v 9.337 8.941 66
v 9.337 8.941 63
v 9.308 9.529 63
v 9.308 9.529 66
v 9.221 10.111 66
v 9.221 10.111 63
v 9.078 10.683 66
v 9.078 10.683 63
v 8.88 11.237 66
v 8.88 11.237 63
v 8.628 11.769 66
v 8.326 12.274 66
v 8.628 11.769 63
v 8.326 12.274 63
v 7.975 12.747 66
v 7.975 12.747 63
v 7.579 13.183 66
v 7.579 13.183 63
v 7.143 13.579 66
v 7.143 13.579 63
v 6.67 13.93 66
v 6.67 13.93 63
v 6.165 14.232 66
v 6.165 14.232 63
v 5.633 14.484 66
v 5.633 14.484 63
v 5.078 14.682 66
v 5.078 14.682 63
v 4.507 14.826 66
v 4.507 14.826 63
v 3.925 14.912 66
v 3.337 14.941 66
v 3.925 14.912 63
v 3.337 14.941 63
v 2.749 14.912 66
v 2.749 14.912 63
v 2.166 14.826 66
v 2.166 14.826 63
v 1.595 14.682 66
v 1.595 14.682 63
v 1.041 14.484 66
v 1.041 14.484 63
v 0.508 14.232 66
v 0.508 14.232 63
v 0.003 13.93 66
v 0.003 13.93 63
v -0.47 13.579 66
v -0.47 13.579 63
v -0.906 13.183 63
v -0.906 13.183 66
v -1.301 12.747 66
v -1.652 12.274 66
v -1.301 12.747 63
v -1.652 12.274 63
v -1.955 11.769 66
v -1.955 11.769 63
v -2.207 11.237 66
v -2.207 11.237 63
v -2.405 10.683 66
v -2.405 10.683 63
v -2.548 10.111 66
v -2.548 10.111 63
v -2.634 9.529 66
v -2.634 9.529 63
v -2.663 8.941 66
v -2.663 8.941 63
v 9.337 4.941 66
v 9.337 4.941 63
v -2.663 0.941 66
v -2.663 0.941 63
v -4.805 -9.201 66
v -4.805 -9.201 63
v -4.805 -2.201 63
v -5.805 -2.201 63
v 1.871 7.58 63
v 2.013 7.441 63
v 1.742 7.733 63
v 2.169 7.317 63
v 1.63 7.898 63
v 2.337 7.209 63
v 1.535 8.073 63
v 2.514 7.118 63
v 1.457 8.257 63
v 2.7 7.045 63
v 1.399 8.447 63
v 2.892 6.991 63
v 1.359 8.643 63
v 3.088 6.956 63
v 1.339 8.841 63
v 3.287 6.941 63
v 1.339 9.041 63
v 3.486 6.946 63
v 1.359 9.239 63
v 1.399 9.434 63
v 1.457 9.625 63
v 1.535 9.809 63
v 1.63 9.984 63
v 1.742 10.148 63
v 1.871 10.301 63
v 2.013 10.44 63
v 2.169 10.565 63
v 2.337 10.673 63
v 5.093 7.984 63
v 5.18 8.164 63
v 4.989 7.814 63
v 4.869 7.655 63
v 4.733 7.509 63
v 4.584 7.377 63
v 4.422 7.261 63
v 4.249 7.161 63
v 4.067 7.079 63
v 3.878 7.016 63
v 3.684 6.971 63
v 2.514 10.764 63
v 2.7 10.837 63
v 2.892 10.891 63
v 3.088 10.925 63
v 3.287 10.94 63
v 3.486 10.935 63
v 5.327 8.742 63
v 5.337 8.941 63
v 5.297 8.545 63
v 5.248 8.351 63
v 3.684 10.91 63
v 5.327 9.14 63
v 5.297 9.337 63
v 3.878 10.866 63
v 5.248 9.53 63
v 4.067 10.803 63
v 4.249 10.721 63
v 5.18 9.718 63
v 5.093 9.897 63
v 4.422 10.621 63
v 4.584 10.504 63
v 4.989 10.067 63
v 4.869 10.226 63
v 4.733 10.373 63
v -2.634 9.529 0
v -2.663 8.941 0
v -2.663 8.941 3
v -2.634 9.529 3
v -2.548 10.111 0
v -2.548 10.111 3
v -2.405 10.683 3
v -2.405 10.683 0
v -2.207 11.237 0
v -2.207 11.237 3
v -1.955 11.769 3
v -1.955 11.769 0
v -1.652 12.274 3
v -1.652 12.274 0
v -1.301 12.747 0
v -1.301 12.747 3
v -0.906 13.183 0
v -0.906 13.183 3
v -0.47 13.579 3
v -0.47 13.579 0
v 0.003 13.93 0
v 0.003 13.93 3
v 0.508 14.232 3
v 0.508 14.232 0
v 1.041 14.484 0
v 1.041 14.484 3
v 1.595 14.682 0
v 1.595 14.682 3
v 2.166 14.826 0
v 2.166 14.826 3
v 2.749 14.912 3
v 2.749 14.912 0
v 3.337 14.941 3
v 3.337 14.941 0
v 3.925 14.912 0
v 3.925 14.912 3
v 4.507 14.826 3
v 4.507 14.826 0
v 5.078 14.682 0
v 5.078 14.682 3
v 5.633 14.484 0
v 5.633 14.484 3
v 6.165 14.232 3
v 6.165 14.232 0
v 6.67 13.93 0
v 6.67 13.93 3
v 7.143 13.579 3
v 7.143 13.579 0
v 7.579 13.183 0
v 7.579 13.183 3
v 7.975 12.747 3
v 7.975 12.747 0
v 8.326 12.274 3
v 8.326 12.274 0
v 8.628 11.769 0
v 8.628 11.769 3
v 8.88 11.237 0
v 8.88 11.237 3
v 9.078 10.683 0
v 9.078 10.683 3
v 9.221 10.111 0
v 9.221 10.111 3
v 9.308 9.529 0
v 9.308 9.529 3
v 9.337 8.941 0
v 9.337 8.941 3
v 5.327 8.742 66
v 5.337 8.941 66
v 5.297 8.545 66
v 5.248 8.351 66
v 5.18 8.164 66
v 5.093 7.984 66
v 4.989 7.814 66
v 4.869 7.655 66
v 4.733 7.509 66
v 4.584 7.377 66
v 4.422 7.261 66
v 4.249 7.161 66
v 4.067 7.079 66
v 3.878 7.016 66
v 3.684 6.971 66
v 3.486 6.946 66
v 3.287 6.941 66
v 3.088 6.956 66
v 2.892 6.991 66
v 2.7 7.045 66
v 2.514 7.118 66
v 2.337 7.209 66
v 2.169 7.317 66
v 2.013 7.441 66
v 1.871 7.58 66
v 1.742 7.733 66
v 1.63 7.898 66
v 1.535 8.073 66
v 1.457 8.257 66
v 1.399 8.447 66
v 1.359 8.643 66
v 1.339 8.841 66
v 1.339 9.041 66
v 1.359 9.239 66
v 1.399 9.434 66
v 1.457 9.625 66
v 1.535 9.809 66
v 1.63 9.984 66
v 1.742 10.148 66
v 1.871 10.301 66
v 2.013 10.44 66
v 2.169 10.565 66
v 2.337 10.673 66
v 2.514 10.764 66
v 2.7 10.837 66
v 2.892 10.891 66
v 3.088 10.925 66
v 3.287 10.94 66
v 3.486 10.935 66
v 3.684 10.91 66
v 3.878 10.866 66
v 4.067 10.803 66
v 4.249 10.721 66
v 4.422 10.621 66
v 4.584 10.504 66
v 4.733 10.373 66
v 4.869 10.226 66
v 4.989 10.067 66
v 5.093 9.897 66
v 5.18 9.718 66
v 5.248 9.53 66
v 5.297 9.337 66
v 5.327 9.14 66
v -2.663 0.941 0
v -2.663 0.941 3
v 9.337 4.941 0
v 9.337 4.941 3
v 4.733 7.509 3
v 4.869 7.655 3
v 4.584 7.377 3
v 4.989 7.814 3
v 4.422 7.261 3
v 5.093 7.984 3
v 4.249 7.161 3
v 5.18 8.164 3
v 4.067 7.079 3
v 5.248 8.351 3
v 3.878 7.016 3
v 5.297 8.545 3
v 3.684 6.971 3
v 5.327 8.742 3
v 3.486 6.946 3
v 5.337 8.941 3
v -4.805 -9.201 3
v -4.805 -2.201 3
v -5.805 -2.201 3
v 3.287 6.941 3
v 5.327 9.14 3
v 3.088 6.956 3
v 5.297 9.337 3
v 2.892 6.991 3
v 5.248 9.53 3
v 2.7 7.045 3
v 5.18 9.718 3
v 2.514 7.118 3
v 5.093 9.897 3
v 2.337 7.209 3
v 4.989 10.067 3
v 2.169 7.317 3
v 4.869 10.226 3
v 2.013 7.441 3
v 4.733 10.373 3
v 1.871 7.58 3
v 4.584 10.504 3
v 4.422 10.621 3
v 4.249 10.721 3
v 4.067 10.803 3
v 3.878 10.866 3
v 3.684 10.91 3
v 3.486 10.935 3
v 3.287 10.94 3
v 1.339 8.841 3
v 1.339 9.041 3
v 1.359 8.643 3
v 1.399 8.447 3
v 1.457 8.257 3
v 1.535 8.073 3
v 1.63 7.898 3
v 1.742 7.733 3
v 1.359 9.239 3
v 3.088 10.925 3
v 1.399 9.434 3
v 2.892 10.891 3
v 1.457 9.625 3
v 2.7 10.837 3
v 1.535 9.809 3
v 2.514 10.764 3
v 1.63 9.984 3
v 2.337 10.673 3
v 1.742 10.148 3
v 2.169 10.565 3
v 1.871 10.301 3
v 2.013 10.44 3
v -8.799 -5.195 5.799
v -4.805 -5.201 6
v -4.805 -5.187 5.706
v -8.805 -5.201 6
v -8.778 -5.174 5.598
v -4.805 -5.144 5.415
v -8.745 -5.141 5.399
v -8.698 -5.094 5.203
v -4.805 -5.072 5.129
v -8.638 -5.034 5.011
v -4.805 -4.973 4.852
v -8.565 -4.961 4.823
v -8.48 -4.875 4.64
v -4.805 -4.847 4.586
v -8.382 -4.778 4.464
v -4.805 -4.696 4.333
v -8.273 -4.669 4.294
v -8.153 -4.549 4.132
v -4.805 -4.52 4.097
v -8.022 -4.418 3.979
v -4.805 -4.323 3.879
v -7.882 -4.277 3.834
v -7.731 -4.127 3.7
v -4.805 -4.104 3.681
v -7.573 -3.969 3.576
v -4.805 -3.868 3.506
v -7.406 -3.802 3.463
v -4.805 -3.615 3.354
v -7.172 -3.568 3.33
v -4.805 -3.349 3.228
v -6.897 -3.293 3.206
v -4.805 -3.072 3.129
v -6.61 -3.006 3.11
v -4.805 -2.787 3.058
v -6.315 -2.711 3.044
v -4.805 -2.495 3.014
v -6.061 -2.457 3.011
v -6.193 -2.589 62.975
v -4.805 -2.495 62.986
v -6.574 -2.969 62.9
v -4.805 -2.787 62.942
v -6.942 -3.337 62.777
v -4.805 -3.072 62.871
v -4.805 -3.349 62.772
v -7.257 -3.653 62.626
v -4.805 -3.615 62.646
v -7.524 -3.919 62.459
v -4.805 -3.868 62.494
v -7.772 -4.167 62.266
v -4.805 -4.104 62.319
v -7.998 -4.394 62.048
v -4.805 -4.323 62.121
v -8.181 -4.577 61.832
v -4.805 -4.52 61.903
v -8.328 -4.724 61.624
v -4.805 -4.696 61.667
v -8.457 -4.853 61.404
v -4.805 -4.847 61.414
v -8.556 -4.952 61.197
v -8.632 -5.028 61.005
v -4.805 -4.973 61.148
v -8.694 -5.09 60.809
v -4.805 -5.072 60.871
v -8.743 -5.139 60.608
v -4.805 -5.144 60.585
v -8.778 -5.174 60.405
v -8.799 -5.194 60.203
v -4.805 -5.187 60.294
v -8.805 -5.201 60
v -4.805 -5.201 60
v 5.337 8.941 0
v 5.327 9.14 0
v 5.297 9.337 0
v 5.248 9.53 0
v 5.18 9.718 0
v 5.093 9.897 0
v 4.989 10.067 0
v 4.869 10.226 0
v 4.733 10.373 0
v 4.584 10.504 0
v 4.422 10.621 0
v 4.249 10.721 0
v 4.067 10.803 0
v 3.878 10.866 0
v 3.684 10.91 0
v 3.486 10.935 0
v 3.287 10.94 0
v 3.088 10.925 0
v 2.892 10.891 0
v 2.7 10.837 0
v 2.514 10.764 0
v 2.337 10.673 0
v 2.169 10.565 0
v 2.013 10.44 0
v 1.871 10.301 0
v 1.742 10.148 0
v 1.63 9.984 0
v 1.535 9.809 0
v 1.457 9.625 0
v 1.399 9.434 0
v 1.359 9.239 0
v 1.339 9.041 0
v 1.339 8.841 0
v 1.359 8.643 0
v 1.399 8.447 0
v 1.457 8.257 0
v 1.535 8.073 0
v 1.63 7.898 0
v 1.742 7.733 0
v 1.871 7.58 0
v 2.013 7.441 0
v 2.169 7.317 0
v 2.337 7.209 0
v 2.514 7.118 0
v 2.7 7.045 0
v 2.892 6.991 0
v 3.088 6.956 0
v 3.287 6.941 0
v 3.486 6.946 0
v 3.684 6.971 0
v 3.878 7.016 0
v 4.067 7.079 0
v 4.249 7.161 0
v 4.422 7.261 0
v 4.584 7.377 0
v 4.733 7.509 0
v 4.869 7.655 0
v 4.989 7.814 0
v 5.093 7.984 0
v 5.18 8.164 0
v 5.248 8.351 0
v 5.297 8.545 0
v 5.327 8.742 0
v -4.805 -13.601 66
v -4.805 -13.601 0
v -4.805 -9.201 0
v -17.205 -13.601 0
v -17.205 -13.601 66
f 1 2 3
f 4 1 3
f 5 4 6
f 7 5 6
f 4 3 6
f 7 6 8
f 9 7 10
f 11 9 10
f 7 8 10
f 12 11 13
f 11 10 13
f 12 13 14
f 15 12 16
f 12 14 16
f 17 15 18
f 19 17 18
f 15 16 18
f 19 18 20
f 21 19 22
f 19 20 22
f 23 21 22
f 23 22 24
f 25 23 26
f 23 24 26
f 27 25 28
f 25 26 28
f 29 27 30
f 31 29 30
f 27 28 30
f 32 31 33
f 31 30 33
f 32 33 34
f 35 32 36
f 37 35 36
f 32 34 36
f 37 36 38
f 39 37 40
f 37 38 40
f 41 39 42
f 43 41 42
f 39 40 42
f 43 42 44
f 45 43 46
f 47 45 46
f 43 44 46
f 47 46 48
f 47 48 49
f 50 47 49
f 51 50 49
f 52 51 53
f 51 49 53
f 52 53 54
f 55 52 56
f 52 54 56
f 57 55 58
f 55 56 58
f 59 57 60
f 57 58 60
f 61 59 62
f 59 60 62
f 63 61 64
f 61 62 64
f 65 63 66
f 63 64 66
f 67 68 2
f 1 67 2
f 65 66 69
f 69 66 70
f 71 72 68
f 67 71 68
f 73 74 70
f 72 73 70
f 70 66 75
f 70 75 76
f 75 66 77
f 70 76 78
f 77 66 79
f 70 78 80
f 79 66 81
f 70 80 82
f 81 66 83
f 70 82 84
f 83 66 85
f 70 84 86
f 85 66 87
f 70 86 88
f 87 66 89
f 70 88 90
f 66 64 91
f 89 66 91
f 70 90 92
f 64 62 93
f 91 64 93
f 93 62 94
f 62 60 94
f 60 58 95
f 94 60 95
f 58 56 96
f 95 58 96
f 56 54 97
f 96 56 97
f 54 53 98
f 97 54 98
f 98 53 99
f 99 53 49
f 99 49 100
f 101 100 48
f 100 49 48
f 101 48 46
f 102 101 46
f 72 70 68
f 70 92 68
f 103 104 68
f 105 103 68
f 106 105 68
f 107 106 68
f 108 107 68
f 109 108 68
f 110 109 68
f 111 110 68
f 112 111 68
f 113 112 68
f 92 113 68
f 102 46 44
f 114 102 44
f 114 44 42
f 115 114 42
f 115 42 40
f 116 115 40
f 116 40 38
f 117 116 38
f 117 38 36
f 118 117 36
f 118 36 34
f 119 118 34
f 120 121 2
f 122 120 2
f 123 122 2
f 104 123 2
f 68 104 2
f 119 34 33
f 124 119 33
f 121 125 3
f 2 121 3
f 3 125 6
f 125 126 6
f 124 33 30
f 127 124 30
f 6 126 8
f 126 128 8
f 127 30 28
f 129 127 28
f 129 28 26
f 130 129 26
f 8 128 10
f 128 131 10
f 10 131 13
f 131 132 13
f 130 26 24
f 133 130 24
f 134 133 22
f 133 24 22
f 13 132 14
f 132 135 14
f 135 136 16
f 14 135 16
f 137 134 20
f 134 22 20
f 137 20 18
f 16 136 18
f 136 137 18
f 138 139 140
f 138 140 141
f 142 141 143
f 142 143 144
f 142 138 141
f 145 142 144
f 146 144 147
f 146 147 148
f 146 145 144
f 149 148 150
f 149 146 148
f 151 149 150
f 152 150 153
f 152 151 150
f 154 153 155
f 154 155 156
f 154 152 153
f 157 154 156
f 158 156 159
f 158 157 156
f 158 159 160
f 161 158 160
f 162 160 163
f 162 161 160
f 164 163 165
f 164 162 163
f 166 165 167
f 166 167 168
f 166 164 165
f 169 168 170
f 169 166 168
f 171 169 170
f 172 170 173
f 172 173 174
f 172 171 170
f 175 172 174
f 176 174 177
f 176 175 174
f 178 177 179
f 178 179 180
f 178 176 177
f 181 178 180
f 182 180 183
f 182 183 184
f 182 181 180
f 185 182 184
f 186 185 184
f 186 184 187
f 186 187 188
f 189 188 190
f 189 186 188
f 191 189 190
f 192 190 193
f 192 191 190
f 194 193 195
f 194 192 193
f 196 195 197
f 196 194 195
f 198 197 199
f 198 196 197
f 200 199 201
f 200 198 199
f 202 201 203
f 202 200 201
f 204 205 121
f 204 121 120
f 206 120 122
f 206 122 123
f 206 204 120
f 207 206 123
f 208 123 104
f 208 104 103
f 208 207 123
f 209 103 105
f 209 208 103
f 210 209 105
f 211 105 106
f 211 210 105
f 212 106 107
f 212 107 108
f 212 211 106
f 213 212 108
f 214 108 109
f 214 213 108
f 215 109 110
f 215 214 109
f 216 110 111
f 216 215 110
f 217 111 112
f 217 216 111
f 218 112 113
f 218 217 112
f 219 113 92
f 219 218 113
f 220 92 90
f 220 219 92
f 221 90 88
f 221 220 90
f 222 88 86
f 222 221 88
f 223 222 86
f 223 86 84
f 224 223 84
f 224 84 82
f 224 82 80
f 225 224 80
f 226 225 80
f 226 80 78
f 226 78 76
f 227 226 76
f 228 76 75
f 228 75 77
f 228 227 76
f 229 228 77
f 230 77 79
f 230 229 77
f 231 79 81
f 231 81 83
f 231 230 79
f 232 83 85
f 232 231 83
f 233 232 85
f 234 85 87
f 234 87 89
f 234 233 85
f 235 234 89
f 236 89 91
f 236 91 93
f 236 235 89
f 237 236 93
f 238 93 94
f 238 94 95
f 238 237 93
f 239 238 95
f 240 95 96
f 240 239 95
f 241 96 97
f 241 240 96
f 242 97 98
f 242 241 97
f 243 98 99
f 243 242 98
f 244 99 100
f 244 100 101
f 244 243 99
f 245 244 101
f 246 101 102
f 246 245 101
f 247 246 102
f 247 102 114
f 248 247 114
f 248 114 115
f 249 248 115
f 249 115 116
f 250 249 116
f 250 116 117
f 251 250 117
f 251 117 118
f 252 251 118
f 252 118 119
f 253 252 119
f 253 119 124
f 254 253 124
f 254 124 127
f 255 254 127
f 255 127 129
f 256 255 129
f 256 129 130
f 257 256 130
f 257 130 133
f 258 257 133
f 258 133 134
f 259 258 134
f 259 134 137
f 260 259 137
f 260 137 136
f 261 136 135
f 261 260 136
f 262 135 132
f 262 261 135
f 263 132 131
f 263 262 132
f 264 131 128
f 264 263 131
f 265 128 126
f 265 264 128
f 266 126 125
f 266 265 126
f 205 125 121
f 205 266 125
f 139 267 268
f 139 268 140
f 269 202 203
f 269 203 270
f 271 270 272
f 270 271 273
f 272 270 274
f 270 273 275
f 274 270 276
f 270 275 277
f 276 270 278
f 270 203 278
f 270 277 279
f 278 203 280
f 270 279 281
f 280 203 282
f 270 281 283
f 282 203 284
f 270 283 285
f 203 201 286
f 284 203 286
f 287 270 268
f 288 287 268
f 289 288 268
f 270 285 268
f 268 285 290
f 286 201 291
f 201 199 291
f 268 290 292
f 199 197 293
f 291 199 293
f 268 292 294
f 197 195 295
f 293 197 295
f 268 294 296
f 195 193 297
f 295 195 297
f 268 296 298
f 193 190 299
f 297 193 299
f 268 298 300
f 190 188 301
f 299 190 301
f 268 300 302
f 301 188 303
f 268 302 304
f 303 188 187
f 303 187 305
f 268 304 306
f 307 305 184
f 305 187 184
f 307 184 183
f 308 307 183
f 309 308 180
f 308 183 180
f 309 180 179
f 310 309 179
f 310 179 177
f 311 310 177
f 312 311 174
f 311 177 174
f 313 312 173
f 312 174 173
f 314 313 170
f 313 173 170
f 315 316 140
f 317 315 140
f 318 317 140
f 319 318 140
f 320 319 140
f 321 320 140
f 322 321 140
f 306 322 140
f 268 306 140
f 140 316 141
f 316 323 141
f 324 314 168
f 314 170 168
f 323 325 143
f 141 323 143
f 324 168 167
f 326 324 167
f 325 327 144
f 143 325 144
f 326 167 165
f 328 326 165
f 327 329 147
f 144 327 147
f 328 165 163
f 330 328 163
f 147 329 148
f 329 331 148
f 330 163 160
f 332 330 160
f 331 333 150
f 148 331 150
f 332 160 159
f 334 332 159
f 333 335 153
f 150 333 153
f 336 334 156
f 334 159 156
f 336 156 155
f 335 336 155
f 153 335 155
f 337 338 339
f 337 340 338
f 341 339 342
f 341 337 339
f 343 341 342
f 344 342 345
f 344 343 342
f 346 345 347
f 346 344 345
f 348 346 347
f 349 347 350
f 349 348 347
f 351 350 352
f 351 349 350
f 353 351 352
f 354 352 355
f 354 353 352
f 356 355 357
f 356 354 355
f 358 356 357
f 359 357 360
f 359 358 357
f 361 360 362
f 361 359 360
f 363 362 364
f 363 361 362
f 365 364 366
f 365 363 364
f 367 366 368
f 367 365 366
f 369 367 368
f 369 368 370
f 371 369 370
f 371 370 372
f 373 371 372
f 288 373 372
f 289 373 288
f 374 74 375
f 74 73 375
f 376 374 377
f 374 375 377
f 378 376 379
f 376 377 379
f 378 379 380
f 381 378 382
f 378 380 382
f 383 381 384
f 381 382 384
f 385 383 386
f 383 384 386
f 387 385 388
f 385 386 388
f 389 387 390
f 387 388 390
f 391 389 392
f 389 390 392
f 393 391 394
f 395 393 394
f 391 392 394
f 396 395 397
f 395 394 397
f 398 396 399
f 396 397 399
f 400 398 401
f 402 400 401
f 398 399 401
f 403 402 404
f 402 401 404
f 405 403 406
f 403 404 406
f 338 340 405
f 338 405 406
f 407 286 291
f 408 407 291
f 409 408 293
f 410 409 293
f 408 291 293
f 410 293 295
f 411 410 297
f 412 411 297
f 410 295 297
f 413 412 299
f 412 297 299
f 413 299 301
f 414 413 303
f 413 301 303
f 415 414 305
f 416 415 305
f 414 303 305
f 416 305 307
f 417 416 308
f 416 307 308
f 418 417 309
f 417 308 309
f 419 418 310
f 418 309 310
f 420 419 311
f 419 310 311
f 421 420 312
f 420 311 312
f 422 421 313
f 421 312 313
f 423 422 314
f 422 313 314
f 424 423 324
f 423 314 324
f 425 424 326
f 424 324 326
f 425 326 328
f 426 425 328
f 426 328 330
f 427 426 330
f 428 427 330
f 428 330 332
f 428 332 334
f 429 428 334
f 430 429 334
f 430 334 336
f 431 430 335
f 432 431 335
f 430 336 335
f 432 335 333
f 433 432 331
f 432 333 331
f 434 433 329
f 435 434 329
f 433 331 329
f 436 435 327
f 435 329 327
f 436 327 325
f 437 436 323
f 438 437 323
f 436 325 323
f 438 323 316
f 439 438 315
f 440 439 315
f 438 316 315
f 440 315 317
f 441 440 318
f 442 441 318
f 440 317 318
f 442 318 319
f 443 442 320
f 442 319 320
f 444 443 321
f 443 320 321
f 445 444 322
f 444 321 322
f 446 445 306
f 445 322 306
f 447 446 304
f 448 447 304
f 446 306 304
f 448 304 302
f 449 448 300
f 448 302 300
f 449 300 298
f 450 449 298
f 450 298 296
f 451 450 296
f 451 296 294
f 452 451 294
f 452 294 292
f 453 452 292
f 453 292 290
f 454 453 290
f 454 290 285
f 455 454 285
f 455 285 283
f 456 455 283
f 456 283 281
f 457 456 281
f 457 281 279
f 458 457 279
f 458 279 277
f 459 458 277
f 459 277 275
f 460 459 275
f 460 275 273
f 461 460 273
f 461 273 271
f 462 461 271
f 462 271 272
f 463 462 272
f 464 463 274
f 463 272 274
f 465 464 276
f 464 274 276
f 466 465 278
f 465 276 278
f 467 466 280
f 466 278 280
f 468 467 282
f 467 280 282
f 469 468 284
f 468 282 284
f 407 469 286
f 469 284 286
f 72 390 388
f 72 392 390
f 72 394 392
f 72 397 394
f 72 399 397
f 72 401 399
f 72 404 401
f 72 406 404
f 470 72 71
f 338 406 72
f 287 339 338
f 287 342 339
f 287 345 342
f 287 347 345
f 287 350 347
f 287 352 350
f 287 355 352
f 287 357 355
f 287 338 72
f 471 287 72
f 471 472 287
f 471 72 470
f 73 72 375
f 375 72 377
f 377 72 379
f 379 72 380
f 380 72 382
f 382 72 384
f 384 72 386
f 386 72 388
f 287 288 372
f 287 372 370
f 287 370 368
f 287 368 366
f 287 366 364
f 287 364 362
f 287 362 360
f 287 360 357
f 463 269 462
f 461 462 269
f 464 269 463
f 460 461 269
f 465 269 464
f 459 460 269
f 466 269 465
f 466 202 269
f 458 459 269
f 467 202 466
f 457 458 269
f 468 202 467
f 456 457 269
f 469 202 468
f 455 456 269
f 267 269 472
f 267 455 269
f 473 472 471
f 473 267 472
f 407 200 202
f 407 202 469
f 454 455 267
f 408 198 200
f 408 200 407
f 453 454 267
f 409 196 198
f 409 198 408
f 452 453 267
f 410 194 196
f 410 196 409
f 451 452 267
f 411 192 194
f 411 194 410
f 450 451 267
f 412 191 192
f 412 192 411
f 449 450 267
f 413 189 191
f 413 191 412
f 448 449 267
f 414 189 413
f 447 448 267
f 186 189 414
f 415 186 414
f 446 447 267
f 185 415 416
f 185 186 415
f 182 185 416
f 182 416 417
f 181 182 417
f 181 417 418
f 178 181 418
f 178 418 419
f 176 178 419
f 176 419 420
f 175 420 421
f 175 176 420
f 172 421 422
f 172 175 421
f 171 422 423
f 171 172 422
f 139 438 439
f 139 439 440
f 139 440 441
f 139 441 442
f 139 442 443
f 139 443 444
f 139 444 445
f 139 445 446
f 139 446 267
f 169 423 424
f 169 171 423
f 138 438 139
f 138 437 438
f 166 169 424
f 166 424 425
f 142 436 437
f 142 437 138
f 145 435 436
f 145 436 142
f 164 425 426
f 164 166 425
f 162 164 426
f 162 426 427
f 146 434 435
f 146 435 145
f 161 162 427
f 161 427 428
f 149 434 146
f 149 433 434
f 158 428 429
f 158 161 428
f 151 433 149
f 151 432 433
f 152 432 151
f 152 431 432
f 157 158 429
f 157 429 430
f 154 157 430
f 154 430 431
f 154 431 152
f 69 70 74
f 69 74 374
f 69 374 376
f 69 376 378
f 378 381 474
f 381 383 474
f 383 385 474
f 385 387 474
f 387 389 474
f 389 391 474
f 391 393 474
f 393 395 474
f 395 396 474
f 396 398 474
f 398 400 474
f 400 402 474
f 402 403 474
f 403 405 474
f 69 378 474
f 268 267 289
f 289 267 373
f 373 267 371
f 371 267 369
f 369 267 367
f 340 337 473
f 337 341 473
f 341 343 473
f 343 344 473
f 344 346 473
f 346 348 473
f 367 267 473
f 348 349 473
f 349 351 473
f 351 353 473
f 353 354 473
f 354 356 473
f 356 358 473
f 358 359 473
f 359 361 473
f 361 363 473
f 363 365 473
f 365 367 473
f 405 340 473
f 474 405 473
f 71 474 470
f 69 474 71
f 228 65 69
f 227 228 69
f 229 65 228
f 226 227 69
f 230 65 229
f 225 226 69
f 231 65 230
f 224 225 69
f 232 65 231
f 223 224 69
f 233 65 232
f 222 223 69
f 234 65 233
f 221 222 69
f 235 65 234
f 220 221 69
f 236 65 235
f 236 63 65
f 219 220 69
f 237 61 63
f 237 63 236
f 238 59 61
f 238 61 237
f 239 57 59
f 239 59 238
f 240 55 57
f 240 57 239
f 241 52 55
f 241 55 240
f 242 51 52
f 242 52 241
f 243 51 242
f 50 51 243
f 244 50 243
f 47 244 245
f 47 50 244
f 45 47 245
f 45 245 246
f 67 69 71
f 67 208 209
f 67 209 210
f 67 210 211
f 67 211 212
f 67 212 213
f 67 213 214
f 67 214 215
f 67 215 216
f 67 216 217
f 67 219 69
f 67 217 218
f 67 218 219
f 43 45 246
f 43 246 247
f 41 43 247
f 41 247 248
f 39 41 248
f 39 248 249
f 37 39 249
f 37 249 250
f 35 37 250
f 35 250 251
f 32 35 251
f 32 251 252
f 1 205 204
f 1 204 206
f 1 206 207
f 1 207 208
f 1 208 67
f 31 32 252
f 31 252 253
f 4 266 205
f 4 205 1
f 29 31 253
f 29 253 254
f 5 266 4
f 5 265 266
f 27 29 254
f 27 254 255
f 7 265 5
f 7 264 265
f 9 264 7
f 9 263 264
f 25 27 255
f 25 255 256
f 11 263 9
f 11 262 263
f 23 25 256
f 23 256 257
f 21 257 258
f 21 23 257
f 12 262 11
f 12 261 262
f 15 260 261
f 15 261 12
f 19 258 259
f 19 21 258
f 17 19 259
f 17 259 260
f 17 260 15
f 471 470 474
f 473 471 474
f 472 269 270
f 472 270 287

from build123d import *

# Parameters (mm, degrees)
EXTRUDE1_DEPTH = 3
EXTRUDE2_DEPTH = 66
EXTRUDE3_START = -3
EXTRUDE3_DEPTH = 3
SKETCH2_R      = 2
EXTRUDE4_DEPTH = 3
EXTRUDE5_START = -3
SKETCH6_R      = 2
EXTRUDE5_DEPTH = 3
FILLET3_R      = 3


with BuildPart() as part:
    # Sketch1 → Extrude1 (new body)
    with BuildSketch(Plane.XY):
        with BuildLine():
            Line((-8.805401881, -5.201299994), (-2.663266257, 0.94083563))
            Line((-2.663266257, 0.94083563), (-2.663266257, 8.94083563))
            ThreePointArc((-2.663266257, 8.94083563), (3.336733743, 14.94083563), (9.336733743, 8.94083563))
            Line((9.336733743, 8.94083563), (9.336733743, 4.94083563))
            Line((9.336733743, 4.94083563), (-4.805401881, -9.201299994))
            Line((-4.805401881, -9.201299994), (-4.805401881, -5.201299994))
            Line((-4.805401881, -5.201299994), (-8.805401881, -5.201299994))
        make_face()
    extrude(amount=EXTRUDE1_DEPTH)

    # Sketch3 → Extrude2 (add)
    with BuildSketch(Plane.XY):
        Polygon((-8.805401881, -5.201299994), (-4.805401881, -5.201299994), (-4.805401881, -13.601299994), (-17.205401881, -13.601299994), align=None)
    extrude(amount=EXTRUDE2_DEPTH)

    # Sketch4 → Extrude3 (add)
    with BuildSketch(Plane.XY.offset(66).offset(EXTRUDE3_START)):
        with BuildLine():
            Line((-8.805401881, -5.201299994), (-4.805401881, -5.201299994))
            Line((-4.805401881, -5.201299994), (-4.805401881, -9.201299994))
            Line((-4.805401881, -9.201299994), (9.336733743, 4.94083563))
            Line((9.336733743, 4.94083563), (9.336733743, 8.94083563))
            ThreePointArc((9.336733743, 8.94083563), (3.336733743, 14.94083563), (-2.663266257, 8.94083563))
            Line((-2.663266257, 8.94083563), (-2.663266257, 0.94083563))
            Line((-2.663266257, 0.94083563), (-8.805401881, -5.201299994))
        make_face()
    extrude(amount=EXTRUDE3_DEPTH)

    # Sketch2 → Extrude4 (cut)
    with BuildSketch(Plane.XY.offset(3)):
        with Locations((3.336733743, 8.94083563)):
            Circle(SKETCH2_R)
    extrude(amount=-EXTRUDE4_DEPTH, mode=Mode.SUBTRACT)

    # Sketch6 → Extrude5 (cut)
    with BuildSketch(Plane(origin=(0, 0, 63), x_dir=(-1, 0, 0), z_dir=(0, 0, -1)).offset(EXTRUDE5_START)):
        with Locations(Location((-3.336733743, 8.94083563, 0), (0, 0, 180))):
            Circle(SKETCH6_R)
    extrude(amount=EXTRUDE5_DEPTH, mode=Mode.SUBTRACT)

    # Fillet3
    fillet3_edges = [part.edges().sort_by_distance(p)[0] for p in [
        (-6.805401881, -5.201299994, 3),
        (-6.805401881, -5.201299994, 63),
    ]]
    fillet(fillet3_edges, radius=FILLET3_R)


solid = part.part
